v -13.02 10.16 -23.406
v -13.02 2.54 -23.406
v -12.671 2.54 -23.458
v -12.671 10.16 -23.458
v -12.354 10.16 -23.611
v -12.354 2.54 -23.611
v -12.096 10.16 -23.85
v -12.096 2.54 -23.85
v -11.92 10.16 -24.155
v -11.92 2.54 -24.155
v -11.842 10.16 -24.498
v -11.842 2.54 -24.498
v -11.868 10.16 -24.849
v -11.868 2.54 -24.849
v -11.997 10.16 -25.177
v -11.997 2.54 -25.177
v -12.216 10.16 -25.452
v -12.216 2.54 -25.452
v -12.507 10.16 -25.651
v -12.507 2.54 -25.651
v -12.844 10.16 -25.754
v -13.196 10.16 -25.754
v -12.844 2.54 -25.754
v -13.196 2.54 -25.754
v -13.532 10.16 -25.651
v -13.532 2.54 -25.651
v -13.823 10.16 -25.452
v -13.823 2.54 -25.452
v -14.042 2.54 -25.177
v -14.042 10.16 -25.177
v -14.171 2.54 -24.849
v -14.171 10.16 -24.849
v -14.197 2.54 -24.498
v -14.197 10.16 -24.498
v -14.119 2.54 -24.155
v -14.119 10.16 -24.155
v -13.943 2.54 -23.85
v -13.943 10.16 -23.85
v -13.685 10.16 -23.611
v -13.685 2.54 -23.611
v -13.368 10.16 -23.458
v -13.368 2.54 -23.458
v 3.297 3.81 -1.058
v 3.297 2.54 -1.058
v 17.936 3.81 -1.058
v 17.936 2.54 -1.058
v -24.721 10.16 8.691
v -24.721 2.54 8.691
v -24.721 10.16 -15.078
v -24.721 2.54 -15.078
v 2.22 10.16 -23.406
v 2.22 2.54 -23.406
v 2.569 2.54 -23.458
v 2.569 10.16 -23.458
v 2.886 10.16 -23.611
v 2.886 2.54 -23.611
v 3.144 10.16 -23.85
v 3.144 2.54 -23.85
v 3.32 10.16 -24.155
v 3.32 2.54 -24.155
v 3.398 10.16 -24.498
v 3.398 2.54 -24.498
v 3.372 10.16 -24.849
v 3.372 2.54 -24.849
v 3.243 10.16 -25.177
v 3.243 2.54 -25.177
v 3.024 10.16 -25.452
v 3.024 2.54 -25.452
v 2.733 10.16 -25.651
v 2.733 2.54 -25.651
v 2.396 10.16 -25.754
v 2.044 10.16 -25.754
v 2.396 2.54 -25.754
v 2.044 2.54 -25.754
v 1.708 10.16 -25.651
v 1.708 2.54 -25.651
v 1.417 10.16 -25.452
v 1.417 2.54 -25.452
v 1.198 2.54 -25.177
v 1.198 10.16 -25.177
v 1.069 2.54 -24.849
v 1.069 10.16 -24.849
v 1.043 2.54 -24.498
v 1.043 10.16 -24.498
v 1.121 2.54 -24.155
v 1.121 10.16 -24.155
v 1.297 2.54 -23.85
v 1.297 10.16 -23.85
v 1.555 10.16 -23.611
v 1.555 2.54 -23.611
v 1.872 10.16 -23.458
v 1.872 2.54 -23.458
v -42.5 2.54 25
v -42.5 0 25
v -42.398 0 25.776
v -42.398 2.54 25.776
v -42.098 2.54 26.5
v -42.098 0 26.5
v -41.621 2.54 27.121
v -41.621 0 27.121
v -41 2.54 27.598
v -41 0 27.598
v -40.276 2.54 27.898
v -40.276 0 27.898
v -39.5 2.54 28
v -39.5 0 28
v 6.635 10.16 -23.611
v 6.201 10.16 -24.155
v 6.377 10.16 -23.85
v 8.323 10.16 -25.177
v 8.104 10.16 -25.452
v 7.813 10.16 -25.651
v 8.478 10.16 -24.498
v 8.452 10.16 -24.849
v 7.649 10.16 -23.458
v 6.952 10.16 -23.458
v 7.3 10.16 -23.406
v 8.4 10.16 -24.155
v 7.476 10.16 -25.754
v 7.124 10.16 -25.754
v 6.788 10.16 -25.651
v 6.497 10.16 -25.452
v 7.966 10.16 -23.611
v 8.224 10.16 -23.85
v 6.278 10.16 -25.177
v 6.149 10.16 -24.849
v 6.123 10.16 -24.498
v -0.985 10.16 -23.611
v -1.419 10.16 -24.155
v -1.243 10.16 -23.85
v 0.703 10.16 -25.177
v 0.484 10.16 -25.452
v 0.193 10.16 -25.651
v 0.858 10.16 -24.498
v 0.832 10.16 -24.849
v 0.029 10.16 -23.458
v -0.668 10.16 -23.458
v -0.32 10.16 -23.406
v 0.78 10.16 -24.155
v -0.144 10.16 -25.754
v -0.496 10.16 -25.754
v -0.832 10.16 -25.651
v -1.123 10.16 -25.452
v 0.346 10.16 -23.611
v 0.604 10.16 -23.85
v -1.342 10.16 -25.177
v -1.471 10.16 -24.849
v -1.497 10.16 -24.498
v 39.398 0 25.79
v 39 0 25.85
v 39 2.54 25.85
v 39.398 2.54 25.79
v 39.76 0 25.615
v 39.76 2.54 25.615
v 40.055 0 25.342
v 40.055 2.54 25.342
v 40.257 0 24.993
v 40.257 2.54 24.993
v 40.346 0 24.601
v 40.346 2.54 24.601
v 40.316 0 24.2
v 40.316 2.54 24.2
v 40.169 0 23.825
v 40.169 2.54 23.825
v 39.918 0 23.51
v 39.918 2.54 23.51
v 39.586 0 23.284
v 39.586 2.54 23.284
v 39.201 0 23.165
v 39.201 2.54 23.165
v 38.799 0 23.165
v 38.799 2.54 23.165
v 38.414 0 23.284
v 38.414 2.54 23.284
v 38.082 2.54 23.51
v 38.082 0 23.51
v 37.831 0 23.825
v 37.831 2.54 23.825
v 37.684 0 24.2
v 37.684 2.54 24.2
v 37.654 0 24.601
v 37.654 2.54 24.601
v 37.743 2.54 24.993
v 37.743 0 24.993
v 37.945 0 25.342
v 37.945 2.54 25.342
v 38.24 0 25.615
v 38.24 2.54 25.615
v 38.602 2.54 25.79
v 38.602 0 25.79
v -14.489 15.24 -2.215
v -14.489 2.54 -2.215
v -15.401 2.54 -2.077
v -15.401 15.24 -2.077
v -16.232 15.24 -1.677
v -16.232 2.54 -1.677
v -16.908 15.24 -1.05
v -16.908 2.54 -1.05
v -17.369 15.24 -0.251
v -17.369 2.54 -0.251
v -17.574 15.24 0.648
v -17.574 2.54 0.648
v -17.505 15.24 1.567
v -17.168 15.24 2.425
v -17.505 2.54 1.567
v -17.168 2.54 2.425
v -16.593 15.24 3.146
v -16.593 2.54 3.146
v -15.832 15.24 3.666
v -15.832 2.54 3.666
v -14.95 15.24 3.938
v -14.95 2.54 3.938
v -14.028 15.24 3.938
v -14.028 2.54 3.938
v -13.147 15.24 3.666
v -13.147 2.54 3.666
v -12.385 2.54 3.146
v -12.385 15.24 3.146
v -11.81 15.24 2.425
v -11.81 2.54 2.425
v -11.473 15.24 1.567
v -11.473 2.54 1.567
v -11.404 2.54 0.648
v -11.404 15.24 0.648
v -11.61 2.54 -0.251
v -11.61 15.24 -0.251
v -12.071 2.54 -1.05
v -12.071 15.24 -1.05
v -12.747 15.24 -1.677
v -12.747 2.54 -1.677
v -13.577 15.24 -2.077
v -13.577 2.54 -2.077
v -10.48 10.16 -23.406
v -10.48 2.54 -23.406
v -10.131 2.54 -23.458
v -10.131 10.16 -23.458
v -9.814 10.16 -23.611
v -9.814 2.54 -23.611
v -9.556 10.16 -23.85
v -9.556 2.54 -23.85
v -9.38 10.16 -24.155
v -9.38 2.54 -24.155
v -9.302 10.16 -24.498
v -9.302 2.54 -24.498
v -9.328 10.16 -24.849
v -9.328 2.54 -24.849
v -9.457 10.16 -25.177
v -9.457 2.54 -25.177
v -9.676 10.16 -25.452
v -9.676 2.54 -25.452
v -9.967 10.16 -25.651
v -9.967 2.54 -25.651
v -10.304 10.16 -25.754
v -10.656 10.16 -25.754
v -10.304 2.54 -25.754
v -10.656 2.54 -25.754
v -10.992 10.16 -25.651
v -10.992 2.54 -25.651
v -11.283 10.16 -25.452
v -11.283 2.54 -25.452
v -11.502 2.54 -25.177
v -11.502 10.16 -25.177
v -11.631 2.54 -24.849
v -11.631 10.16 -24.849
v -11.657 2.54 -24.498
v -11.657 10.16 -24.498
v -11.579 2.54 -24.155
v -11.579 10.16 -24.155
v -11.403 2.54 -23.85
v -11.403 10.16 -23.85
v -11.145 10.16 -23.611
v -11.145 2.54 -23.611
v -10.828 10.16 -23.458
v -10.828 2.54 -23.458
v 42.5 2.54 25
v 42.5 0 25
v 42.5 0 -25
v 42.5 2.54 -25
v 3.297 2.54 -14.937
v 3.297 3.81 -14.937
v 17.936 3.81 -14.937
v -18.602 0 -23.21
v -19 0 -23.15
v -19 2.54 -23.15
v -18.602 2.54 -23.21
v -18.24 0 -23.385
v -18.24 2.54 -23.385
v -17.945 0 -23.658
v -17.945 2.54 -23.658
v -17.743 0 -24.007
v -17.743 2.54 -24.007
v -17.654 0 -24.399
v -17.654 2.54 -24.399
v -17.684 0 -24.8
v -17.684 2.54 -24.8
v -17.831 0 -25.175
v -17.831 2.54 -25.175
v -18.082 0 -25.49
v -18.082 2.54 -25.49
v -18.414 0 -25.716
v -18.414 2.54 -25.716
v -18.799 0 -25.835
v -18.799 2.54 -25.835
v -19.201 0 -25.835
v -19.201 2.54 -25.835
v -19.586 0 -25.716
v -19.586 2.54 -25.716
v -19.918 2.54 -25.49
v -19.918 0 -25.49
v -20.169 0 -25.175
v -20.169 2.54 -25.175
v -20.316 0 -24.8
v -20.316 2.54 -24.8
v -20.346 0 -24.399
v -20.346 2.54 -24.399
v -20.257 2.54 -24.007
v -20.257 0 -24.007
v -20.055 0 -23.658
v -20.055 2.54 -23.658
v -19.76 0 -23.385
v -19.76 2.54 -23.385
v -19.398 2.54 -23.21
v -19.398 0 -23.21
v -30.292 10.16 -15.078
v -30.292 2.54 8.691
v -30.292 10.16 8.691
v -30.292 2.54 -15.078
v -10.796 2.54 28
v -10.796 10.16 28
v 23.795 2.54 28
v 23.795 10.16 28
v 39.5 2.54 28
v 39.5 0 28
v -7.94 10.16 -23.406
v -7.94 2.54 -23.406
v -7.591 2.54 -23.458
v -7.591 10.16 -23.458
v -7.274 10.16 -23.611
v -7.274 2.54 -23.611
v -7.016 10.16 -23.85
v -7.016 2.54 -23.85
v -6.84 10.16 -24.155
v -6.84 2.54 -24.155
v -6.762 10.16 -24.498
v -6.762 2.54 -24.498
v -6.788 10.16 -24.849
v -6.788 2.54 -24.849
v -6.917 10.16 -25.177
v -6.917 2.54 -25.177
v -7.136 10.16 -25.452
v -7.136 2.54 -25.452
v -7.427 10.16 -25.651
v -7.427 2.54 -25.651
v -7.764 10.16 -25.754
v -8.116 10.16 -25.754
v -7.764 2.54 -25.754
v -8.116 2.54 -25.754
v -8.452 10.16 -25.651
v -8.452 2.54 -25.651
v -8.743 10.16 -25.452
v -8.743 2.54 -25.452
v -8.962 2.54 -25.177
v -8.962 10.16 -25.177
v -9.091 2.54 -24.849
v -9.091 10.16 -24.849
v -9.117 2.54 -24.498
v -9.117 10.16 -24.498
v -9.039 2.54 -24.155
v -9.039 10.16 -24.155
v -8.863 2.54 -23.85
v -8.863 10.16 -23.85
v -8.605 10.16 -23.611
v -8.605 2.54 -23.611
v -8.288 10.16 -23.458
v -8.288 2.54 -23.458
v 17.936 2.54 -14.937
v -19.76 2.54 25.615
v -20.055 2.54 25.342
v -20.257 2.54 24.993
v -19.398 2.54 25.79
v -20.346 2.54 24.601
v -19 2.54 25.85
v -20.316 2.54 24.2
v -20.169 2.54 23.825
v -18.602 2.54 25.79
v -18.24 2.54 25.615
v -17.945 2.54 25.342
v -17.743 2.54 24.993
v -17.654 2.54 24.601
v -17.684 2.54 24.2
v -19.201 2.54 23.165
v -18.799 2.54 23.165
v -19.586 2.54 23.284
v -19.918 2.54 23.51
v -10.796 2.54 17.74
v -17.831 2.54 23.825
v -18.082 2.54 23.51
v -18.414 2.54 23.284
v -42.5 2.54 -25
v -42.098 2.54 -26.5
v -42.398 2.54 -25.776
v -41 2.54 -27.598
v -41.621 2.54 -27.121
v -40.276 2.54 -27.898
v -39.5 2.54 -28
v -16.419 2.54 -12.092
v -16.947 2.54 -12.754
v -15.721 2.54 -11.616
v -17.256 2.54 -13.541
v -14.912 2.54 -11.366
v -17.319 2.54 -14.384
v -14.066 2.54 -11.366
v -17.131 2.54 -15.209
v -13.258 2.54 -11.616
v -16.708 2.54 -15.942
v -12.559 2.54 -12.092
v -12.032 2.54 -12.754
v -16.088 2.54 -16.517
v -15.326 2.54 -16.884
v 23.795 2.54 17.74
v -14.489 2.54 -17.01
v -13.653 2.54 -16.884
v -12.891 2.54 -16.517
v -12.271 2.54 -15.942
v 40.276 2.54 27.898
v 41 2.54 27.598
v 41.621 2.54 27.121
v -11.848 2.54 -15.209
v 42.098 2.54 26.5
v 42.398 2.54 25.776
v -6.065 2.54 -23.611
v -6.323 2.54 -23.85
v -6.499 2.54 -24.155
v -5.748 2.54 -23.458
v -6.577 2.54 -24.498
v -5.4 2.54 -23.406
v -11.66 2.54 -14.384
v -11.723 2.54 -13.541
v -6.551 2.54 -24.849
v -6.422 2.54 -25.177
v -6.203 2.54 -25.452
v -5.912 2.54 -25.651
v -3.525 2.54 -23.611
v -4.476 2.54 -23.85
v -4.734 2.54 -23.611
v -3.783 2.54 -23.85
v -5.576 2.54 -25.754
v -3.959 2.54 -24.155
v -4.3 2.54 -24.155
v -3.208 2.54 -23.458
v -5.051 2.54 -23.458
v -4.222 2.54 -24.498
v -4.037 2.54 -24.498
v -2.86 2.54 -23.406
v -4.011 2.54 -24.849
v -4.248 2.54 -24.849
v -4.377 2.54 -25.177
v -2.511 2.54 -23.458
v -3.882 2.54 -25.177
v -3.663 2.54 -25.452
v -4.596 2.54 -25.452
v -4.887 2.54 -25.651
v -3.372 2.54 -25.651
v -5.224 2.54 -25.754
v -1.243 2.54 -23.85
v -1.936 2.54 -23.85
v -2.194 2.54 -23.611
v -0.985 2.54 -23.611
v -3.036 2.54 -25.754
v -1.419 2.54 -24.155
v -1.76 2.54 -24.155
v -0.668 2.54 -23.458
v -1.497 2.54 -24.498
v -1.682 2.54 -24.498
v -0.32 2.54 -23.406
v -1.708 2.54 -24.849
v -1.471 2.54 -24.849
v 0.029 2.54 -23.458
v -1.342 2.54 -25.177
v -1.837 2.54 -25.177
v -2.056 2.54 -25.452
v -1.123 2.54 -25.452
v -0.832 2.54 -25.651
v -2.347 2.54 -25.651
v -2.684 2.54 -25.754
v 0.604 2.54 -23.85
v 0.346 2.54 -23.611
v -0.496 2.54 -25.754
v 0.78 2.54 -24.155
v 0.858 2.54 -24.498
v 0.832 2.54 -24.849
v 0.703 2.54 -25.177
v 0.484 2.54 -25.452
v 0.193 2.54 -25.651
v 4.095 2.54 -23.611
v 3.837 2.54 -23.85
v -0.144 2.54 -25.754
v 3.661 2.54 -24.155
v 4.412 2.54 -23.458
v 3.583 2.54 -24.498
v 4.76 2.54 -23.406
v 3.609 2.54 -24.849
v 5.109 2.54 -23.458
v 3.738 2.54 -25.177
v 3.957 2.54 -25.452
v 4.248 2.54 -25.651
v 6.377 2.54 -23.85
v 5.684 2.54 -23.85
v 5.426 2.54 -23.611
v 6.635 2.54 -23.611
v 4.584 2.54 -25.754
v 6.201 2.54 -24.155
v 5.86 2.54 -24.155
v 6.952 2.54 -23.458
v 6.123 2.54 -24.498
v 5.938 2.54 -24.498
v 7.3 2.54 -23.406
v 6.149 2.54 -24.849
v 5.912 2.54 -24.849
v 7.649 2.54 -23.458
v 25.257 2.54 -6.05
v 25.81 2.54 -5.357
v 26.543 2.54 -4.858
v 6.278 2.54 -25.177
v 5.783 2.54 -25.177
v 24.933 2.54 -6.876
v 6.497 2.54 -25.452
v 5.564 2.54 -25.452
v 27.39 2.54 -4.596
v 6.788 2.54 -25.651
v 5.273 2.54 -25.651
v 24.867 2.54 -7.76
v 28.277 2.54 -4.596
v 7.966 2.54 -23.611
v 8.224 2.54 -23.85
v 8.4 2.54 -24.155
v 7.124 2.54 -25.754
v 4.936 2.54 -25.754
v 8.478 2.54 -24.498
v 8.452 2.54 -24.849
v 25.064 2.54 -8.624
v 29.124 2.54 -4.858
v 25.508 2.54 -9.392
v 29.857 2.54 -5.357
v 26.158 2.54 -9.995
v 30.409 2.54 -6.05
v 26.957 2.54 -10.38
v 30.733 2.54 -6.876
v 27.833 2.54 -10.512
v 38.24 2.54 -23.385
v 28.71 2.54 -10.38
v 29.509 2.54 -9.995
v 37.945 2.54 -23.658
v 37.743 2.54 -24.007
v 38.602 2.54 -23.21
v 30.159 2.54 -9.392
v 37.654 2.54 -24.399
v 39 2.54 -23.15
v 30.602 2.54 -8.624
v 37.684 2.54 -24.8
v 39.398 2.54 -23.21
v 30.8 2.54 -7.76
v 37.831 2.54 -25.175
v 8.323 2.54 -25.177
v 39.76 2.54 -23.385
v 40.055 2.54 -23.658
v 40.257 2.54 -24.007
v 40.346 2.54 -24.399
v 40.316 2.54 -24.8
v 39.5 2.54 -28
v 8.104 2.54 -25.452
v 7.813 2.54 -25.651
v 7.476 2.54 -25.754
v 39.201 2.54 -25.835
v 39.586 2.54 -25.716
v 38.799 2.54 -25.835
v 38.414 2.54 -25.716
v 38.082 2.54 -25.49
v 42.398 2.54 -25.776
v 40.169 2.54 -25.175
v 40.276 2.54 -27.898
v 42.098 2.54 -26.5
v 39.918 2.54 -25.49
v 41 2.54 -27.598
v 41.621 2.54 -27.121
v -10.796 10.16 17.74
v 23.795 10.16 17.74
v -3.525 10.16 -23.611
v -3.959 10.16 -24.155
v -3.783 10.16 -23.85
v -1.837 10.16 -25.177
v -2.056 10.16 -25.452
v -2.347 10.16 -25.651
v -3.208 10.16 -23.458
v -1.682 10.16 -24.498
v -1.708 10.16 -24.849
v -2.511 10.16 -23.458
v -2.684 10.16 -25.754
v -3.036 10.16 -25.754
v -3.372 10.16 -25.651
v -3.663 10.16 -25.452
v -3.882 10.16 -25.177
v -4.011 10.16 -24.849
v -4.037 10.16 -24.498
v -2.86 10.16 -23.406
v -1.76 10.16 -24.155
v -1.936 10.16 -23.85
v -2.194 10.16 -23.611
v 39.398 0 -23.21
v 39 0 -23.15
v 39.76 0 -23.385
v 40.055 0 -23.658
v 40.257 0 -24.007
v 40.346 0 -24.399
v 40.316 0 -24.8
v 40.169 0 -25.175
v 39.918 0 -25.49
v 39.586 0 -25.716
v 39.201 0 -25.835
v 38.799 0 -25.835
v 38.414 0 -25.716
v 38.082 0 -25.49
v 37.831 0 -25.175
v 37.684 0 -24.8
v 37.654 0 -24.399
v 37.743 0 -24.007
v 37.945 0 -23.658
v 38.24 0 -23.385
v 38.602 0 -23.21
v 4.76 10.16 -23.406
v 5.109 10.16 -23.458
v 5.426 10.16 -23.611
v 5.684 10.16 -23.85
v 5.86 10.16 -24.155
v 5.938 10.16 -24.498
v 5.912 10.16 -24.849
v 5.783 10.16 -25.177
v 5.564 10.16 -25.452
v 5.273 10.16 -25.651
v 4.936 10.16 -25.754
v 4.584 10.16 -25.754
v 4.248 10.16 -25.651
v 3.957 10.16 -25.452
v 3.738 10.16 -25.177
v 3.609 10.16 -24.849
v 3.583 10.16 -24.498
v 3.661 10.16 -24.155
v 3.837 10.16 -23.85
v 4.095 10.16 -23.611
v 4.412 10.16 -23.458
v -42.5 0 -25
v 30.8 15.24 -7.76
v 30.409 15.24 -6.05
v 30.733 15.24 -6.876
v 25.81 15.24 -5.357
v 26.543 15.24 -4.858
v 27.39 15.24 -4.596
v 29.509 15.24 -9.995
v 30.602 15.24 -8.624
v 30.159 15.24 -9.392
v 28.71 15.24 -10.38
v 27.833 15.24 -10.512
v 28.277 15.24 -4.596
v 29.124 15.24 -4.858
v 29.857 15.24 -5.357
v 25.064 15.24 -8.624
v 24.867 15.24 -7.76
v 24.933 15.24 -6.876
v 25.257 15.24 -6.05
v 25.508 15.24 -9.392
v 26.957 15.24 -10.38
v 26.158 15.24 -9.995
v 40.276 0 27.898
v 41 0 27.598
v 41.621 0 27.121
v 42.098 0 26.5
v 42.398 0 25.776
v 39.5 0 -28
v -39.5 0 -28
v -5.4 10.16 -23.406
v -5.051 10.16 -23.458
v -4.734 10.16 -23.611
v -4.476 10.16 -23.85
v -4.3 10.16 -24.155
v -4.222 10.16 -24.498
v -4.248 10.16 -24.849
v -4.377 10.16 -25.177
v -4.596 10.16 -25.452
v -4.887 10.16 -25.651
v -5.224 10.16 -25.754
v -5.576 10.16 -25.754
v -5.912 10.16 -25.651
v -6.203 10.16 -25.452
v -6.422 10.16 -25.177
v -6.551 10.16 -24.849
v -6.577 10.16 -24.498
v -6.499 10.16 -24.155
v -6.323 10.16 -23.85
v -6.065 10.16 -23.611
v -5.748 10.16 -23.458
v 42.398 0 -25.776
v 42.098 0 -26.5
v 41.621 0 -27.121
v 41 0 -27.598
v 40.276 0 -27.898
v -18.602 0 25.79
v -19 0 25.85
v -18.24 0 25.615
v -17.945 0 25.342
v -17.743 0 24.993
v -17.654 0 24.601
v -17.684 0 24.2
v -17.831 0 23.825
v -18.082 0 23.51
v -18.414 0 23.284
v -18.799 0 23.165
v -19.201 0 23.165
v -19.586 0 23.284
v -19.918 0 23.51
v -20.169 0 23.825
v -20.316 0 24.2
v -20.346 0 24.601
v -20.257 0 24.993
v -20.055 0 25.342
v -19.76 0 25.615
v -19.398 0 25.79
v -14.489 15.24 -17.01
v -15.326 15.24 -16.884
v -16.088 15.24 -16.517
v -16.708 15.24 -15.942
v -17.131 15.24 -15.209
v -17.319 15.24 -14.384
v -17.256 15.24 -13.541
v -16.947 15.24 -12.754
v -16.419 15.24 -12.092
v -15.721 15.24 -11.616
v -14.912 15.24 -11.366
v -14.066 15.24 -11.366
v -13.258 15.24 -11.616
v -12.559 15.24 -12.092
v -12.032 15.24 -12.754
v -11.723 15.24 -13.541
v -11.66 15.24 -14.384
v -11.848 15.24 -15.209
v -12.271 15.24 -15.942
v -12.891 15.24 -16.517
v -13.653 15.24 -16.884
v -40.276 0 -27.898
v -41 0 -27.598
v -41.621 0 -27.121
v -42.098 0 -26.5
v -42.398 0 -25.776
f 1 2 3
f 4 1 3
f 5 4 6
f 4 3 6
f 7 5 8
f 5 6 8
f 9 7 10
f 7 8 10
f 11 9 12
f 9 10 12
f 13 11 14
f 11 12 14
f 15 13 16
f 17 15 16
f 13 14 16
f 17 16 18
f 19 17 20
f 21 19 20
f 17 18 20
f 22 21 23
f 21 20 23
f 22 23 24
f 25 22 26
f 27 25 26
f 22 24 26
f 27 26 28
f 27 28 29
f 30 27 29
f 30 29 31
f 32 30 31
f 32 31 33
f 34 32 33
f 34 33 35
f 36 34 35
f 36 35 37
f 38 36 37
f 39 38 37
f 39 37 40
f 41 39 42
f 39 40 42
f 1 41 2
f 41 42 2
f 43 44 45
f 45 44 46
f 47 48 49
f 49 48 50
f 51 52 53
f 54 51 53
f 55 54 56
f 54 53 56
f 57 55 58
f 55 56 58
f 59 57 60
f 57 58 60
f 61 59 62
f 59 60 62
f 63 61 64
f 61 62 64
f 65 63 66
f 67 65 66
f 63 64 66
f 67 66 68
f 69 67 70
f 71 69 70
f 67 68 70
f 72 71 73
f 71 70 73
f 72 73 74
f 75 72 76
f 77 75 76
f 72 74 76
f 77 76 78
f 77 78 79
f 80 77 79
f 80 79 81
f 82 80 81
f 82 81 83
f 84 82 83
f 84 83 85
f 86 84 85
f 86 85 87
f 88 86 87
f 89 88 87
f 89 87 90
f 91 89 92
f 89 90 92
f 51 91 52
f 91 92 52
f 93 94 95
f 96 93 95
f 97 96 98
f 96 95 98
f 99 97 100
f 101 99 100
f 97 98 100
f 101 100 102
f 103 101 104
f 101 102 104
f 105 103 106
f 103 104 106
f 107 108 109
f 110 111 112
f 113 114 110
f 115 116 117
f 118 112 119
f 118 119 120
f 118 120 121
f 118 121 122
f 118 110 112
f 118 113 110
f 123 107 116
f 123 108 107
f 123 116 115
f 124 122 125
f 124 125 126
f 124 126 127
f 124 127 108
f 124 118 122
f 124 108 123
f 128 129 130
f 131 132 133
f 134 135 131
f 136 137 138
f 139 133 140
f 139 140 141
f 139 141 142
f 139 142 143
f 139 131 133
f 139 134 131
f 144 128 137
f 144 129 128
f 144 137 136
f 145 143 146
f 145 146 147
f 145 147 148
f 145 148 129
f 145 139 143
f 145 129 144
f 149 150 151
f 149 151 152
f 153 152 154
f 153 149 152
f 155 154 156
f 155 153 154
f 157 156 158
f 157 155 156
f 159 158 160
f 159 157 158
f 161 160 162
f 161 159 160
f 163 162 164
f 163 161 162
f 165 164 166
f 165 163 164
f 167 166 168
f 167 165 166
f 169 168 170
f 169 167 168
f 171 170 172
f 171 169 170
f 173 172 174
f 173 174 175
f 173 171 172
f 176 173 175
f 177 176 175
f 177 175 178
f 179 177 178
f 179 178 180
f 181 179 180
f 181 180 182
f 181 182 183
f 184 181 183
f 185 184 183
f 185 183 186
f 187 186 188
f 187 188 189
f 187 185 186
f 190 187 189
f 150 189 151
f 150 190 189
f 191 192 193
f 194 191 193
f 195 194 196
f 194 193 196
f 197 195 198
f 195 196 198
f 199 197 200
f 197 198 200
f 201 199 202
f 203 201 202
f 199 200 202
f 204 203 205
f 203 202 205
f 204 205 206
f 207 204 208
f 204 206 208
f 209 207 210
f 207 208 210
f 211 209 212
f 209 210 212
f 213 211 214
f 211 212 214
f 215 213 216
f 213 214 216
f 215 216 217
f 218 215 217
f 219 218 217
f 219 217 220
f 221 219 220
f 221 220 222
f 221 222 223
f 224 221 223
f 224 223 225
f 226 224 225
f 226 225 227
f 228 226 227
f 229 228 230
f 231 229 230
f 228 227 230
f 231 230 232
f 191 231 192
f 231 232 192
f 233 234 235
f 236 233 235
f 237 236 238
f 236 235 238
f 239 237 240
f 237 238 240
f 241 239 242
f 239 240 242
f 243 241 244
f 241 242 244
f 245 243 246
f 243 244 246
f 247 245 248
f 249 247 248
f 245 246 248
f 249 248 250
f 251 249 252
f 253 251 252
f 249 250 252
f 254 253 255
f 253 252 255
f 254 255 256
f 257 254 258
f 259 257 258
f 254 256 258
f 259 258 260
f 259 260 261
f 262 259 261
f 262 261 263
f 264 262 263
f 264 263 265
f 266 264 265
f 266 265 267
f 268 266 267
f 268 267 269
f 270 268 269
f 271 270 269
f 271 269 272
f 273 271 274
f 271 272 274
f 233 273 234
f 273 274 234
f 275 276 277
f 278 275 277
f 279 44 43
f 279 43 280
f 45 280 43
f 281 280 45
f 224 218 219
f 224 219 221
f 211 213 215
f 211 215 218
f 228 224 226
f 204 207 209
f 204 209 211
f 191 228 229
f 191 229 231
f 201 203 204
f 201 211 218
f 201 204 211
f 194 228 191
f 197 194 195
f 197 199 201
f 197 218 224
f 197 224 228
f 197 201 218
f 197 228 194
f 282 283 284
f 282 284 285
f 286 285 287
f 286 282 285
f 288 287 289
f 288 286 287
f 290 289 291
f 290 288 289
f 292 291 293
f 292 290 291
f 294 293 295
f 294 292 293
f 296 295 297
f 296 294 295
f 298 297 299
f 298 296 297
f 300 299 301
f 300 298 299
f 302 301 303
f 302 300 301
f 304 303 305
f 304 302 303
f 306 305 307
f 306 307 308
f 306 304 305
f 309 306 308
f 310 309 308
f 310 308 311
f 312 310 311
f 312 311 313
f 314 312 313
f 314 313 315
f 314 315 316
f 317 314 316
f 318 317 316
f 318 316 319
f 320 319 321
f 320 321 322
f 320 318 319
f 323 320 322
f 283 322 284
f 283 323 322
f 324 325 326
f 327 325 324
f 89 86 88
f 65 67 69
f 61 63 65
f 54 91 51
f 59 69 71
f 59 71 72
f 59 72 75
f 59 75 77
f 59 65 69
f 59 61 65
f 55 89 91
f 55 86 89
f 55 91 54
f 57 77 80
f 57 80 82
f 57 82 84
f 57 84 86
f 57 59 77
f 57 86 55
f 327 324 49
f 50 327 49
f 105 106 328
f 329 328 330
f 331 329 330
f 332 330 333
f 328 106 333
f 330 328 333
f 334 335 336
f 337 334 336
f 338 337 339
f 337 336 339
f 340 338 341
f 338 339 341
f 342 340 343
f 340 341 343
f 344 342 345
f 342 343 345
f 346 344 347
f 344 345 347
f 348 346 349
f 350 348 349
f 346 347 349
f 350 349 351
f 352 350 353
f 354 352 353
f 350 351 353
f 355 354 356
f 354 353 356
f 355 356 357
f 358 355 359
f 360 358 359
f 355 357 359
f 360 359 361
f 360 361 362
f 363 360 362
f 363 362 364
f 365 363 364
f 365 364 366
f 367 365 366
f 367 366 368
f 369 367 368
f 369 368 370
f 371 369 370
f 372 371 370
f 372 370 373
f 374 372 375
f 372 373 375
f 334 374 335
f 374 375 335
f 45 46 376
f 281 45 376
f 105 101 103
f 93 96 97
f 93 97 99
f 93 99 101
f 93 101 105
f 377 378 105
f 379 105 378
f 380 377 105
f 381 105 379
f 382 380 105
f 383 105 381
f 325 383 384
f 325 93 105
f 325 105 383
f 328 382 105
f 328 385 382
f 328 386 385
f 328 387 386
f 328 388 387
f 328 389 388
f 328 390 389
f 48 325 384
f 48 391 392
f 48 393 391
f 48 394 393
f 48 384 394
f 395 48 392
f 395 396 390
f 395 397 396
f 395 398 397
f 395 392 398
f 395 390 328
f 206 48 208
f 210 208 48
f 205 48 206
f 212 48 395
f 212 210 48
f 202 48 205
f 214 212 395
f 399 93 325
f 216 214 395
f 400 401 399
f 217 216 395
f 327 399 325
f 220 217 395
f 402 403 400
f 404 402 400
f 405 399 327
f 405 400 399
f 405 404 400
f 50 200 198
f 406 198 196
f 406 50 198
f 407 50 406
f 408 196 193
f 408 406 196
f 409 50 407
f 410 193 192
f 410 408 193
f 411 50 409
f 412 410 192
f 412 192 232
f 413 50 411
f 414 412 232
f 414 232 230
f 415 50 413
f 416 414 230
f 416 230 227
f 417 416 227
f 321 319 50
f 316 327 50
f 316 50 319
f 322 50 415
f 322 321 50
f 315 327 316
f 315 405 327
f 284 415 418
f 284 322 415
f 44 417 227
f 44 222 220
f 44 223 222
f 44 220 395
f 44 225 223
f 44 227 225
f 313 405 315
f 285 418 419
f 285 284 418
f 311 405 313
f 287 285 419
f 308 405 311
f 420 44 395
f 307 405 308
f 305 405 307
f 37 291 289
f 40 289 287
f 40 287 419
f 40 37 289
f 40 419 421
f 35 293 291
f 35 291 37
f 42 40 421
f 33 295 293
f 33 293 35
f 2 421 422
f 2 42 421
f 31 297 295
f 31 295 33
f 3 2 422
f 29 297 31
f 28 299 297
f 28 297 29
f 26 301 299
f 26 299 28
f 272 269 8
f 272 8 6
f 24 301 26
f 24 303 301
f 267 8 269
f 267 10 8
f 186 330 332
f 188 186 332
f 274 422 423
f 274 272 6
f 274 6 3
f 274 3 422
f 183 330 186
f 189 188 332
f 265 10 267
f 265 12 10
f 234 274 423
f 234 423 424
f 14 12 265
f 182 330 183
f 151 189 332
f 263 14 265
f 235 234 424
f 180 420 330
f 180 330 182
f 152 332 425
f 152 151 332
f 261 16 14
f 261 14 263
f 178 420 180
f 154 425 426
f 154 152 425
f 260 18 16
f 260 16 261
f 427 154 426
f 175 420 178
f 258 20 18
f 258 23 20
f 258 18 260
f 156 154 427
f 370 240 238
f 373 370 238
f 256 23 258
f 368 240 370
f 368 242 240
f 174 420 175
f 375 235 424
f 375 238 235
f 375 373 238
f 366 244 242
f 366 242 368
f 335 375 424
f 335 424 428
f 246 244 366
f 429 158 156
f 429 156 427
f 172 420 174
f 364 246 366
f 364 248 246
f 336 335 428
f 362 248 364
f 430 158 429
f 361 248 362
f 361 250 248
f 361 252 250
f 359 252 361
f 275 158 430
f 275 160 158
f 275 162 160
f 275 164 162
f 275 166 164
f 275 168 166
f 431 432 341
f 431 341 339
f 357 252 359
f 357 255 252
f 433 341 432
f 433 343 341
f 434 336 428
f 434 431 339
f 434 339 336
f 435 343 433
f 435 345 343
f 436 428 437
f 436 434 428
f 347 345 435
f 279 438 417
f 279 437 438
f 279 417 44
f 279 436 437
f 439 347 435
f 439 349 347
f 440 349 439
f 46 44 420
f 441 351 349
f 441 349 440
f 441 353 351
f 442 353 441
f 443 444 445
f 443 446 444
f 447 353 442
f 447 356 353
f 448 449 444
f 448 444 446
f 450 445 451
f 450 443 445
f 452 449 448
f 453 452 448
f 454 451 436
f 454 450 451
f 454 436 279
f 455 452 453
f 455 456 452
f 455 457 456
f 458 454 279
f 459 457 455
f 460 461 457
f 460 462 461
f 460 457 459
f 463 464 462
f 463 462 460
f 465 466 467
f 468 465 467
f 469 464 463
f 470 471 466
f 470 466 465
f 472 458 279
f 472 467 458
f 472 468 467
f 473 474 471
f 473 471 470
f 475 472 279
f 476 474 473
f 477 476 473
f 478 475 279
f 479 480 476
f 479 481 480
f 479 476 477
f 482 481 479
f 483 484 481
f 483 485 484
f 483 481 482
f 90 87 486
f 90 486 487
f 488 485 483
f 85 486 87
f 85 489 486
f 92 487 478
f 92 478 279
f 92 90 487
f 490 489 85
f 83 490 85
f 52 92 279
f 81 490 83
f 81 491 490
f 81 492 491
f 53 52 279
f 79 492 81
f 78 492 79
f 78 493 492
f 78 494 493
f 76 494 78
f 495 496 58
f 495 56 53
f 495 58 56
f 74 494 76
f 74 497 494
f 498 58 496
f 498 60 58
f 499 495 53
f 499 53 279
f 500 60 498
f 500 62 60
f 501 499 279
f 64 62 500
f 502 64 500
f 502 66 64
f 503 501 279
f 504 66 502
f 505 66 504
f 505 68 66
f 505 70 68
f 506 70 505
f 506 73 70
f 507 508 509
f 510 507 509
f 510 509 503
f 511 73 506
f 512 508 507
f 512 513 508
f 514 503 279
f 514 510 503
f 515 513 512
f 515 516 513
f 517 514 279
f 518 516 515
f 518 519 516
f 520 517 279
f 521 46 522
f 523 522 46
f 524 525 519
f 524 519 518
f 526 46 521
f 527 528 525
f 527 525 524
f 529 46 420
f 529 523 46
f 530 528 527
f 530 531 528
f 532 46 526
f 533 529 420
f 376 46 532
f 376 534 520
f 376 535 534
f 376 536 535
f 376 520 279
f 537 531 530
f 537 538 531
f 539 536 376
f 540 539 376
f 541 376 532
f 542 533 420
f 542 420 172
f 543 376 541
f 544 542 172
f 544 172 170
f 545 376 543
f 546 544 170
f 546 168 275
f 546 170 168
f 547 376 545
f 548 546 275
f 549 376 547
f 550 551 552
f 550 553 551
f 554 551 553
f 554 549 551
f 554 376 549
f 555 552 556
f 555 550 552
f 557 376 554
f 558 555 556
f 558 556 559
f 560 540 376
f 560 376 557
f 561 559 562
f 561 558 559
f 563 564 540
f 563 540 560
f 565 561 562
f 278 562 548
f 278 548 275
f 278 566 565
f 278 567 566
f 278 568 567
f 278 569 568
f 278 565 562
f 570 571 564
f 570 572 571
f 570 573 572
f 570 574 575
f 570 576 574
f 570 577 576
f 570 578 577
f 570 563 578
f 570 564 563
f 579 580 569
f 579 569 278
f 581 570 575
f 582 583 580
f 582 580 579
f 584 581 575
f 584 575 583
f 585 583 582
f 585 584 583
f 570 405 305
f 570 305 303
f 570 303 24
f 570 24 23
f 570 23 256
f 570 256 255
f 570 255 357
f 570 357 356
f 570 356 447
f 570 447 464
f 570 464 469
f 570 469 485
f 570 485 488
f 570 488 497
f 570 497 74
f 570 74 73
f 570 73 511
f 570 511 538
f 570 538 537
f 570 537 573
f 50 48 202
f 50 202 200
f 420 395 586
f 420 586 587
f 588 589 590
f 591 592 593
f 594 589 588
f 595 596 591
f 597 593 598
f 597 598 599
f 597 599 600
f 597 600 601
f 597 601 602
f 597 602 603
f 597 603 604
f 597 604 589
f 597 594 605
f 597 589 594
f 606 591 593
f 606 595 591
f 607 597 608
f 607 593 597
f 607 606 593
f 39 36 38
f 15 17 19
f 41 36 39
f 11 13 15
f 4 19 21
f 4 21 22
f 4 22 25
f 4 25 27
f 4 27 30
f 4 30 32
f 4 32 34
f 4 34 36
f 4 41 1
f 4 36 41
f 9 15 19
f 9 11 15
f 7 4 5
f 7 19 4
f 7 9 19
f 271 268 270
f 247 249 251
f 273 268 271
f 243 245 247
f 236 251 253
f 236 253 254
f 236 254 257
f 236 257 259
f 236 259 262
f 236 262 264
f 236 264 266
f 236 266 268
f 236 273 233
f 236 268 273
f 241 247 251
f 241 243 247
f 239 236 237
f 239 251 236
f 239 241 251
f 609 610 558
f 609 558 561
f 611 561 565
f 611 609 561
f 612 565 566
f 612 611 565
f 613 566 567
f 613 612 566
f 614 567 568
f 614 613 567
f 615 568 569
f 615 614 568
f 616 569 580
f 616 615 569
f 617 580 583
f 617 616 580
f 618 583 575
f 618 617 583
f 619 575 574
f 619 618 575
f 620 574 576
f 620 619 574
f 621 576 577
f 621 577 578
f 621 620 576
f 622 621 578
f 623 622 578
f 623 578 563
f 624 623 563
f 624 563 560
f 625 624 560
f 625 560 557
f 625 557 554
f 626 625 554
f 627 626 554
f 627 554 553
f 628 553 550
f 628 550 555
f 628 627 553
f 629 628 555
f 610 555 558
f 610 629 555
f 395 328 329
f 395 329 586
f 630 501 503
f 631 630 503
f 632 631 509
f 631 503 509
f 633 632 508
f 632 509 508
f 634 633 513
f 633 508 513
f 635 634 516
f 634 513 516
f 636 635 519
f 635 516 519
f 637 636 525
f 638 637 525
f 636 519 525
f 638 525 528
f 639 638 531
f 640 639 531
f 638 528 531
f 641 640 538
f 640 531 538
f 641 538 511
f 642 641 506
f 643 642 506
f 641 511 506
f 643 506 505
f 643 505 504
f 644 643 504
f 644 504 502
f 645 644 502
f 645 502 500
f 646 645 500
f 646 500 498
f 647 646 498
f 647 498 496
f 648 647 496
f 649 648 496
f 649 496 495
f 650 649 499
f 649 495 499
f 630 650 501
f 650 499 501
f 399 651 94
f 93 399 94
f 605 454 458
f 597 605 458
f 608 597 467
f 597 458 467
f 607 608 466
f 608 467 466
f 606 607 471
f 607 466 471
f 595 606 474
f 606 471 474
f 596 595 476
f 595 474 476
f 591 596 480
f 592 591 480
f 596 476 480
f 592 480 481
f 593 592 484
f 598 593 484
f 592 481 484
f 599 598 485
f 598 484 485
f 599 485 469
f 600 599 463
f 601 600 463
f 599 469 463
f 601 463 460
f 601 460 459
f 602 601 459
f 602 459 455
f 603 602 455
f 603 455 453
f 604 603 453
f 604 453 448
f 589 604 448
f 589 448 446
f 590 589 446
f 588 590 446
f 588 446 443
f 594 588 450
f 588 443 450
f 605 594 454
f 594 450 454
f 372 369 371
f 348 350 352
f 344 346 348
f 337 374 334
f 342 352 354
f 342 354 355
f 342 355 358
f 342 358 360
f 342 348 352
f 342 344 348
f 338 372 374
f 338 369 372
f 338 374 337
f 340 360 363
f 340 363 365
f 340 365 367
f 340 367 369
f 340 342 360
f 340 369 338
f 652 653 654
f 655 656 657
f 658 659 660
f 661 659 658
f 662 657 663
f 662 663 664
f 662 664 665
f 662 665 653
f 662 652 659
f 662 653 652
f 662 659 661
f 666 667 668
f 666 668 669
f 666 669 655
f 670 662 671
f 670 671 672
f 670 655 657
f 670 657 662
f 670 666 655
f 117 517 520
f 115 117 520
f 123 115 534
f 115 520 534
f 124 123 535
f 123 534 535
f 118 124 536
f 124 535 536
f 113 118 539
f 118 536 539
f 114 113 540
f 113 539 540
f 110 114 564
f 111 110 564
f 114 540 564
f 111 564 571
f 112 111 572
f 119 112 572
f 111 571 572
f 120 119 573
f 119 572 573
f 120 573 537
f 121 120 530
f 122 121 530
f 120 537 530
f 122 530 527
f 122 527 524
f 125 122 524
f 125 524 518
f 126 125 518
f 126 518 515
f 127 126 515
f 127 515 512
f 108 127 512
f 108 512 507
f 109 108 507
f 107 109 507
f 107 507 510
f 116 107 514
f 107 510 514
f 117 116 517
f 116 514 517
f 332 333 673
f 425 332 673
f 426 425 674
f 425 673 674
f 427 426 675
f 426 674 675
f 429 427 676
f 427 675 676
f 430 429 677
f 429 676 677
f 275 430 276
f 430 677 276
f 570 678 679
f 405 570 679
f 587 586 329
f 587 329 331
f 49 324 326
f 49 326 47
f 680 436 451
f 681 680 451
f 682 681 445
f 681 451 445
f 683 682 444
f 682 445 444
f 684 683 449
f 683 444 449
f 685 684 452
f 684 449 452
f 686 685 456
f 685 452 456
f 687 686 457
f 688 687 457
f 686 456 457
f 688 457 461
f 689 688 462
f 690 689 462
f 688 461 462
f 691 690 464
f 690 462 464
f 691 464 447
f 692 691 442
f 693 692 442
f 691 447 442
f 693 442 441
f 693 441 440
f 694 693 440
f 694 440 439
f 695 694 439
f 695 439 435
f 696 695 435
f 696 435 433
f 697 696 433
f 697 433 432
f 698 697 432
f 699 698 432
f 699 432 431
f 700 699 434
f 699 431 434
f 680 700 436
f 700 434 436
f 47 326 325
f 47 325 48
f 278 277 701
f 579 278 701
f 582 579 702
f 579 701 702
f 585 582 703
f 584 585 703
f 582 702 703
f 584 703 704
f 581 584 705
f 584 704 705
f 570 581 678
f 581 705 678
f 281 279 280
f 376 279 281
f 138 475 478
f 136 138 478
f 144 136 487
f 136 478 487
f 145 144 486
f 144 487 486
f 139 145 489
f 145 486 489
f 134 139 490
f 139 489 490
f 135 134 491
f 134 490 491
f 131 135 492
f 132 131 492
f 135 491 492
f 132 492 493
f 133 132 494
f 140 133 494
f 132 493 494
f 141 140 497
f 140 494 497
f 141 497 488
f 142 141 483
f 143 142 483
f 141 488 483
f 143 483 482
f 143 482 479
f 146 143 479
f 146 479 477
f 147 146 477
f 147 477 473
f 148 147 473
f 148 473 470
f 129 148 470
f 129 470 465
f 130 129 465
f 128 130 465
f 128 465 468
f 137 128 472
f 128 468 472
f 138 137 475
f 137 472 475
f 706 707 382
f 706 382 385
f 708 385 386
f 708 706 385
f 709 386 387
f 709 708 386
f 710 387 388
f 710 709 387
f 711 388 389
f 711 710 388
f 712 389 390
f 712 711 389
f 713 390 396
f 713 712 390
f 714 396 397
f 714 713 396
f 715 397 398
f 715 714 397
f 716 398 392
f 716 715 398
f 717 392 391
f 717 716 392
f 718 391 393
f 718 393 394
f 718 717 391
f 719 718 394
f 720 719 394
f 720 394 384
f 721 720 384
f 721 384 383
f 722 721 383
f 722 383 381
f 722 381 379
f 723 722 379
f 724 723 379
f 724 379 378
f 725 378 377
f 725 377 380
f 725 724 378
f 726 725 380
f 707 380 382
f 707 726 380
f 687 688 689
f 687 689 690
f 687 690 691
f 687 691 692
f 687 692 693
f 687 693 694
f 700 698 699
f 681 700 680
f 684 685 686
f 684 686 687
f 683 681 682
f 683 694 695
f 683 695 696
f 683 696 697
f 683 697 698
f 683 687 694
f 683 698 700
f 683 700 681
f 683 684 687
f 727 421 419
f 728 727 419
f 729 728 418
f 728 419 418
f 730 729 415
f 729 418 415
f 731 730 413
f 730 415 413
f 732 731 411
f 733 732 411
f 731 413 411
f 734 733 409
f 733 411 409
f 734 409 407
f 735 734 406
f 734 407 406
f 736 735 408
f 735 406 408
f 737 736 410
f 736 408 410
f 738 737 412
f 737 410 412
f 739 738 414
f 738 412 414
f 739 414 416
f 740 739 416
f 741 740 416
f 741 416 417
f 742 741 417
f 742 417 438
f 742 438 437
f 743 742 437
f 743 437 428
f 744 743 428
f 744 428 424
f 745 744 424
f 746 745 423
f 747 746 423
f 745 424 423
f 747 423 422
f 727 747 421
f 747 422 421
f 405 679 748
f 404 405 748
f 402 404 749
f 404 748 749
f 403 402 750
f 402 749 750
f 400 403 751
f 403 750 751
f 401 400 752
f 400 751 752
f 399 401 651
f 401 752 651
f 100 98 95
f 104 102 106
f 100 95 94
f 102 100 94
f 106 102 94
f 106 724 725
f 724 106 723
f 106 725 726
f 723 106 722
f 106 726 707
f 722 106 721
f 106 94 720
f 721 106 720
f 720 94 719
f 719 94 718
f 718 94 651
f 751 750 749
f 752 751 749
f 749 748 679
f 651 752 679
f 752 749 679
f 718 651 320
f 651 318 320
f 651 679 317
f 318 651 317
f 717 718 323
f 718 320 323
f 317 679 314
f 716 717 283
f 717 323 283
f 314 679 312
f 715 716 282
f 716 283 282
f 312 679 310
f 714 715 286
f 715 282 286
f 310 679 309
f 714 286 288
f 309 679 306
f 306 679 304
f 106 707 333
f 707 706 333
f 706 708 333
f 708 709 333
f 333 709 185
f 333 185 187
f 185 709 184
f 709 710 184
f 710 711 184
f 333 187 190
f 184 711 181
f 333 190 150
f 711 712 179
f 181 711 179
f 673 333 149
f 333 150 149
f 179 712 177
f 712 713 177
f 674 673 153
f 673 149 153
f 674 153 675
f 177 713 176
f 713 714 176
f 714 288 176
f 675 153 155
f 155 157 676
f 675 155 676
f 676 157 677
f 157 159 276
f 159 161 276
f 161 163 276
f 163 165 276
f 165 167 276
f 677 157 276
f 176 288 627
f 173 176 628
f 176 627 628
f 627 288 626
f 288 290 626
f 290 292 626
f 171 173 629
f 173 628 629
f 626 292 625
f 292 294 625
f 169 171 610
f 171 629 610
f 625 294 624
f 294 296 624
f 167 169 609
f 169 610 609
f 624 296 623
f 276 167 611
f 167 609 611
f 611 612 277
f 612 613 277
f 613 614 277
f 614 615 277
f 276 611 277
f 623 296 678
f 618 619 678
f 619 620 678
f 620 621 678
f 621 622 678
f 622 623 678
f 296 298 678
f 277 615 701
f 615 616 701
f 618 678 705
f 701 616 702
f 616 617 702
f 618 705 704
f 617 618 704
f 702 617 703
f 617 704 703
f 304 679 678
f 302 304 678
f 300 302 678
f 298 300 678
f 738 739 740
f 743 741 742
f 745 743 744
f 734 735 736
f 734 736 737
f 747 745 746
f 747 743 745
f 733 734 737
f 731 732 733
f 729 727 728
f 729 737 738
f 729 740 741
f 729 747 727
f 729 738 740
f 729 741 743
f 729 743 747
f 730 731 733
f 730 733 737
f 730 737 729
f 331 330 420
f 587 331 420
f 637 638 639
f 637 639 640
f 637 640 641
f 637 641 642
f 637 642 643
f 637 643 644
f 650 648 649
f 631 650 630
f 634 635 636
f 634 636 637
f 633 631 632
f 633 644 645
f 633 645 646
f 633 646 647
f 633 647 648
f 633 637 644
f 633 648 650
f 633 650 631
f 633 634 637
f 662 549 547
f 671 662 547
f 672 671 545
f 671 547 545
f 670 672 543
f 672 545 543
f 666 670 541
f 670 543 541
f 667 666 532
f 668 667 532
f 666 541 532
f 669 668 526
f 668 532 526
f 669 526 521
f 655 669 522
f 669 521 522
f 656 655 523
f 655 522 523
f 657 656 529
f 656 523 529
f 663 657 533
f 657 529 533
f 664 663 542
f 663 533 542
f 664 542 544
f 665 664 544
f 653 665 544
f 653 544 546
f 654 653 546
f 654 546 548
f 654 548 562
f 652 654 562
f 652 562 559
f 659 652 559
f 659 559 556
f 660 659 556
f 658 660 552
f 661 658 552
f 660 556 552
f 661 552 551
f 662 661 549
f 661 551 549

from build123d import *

# Parameters (mm, degrees)
SKETCH1_R           = 1.35
BOSS_EXTRUDE1_DEPTH = 2.54
SKETCH2_W           = 34.5908584
SKETCH2_H           = 10.2596717
BOSS_EXTRUDE2_DEPTH = 7.62
SKETCH3_W           = 5.570985132
SKETCH3_H           = 23.769243549
BOSS_EXTRUDE3_DEPTH = 7.62
SKETCH4_W           = 14.639482868
SKETCH4_H           = 13.879415804
BOSS_EXTRUDE4_DEPTH = 1.27
SKETCH5_R           = 1.180885515
BOSS_EXTRUDE5_DEPTH = 7.62
SKETCH6_R           = 2.837726638
SKETCH6_R_2         = 3.093496415
SKETCH6_R_3         = 2.974585048
BOSS_EXTRUDE6_DEPTH = 12.7


with BuildPart() as part:
    # Sketch1 → Boss-Extrude1 (new body)
    with BuildSketch(Plane(origin=(0, 0, 0), x_dir=(1, 0, 0), z_dir=(0, 1, 0))):
        with BuildLine():
            ThreePointArc((42.5, 25.000002241), (41.621321, 27.121321), (39.500002241, 28))
            Line((39.500002241, 28), (-39.500002241, 28))
            ThreePointArc((-39.500002241, 28), (-41.621321, 27.121321), (-42.5, 25.000002241))
            Line((-42.5, 25.000002241), (-42.5, -25.000002241))
            ThreePointArc((-42.5, -25.000002241), (-41.621321, -27.121321), (-39.500002241, -28))
            Line((-39.500002241, -28), (39.500002241, -28))
            ThreePointArc((39.500002241, -28), (41.621321, -27.121321), (42.5, -25.000002241))
            Line((42.5, -25.000002241), (42.5, 25.000002241))
        make_face()
        with Locations((-19, -24.5)):
            Circle(SKETCH1_R, mode=Mode.SUBTRACT)
        with Locations((39, -24.5)):
            Circle(SKETCH1_R, mode=Mode.SUBTRACT)
        with Locations((-19, 24.5)):
            Circle(SKETCH1_R, mode=Mode.SUBTRACT)
        with Locations((39, 24.5)):
            Circle(SKETCH1_R, mode=Mode.SUBTRACT)
    extrude(amount=BOSS_EXTRUDE1_DEPTH)

    # Sketch2 → Boss-Extrude2 (add)
    with BuildSketch(Plane(origin=(0, 2.54, 0), x_dir=(1, 0, 0), z_dir=(0, 1, 0))):
        with Locations((6.499175034, -22.87016415)):
            Rectangle(SKETCH2_W, SKETCH2_H)
    extrude(amount=BOSS_EXTRUDE2_DEPTH)

    # Sketch3 → Boss-Extrude3 (add)
    with BuildSketch(Plane(origin=(0, 2.54, 0), x_dir=(1, 0, 0), z_dir=(0, 1, 0))):
        with Locations((-27.506444174, 3.193413678)):
            Rectangle(SKETCH3_W, SKETCH3_H)
    extrude(amount=BOSS_EXTRUDE3_DEPTH)

    # Sketch4 → Boss-Extrude4 (add)
    with BuildSketch(Plane(origin=(0, 2.54, 0), x_dir=(1, 0, 0), z_dir=(0, 1, 0))):
        with Locations((10.616389604, 7.997233107)):
            Rectangle(SKETCH4_W, SKETCH4_H)
    extrude(amount=BOSS_EXTRUDE4_DEPTH)

    # Sketch5 → Boss-Extrude5 (add)
    with BuildSketch(Plane(origin=(0, 2.54, 0), x_dir=(1, 0, 0), z_dir=(0, 1, 0))):
        with Locations((-13.019538676, 24.586601174)):
            Circle(SKETCH5_R)
        with Locations((-10.479538676, 24.586601174)):
            Circle(SKETCH5_R)
        with Locations((-7.939538676, 24.586601174)):
            Circle(SKETCH5_R)
        with Locations((-5.399538676, 24.586601174)):
            Circle(SKETCH5_R)
        with Locations((-2.859538676, 24.586601174)):
            Circle(SKETCH5_R)
        with Locations((-0.319538676, 24.586601174)):
            Circle(SKETCH5_R)
        with Locations((2.220461324, 24.586601174)):
            Circle(SKETCH5_R)
        with Locations((4.760461324, 24.586601174)):
            Circle(SKETCH5_R)
        with Locations((7.300461324, 24.586601174)):
            Circle(SKETCH5_R)
    extrude(amount=BOSS_EXTRUDE5_DEPTH)

    # Sketch6 → Boss-Extrude6 (add)
    with BuildSketch(Plane(origin=(0, 2.54, 0), x_dir=(1, 0, 0), z_dir=(0, 1, 0))):
        with Locations((-14.489308001, 14.172406875)):
            Circle(SKETCH6_R)
        with Locations((-14.489308001, -0.87870872)):
            Circle(SKETCH6_R_2)
        with Locations((27.833366931, 7.537539442)):
            Circle(SKETCH6_R_3)
    extrude(amount=BOSS_EXTRUDE6_DEPTH)


solid = part.part
